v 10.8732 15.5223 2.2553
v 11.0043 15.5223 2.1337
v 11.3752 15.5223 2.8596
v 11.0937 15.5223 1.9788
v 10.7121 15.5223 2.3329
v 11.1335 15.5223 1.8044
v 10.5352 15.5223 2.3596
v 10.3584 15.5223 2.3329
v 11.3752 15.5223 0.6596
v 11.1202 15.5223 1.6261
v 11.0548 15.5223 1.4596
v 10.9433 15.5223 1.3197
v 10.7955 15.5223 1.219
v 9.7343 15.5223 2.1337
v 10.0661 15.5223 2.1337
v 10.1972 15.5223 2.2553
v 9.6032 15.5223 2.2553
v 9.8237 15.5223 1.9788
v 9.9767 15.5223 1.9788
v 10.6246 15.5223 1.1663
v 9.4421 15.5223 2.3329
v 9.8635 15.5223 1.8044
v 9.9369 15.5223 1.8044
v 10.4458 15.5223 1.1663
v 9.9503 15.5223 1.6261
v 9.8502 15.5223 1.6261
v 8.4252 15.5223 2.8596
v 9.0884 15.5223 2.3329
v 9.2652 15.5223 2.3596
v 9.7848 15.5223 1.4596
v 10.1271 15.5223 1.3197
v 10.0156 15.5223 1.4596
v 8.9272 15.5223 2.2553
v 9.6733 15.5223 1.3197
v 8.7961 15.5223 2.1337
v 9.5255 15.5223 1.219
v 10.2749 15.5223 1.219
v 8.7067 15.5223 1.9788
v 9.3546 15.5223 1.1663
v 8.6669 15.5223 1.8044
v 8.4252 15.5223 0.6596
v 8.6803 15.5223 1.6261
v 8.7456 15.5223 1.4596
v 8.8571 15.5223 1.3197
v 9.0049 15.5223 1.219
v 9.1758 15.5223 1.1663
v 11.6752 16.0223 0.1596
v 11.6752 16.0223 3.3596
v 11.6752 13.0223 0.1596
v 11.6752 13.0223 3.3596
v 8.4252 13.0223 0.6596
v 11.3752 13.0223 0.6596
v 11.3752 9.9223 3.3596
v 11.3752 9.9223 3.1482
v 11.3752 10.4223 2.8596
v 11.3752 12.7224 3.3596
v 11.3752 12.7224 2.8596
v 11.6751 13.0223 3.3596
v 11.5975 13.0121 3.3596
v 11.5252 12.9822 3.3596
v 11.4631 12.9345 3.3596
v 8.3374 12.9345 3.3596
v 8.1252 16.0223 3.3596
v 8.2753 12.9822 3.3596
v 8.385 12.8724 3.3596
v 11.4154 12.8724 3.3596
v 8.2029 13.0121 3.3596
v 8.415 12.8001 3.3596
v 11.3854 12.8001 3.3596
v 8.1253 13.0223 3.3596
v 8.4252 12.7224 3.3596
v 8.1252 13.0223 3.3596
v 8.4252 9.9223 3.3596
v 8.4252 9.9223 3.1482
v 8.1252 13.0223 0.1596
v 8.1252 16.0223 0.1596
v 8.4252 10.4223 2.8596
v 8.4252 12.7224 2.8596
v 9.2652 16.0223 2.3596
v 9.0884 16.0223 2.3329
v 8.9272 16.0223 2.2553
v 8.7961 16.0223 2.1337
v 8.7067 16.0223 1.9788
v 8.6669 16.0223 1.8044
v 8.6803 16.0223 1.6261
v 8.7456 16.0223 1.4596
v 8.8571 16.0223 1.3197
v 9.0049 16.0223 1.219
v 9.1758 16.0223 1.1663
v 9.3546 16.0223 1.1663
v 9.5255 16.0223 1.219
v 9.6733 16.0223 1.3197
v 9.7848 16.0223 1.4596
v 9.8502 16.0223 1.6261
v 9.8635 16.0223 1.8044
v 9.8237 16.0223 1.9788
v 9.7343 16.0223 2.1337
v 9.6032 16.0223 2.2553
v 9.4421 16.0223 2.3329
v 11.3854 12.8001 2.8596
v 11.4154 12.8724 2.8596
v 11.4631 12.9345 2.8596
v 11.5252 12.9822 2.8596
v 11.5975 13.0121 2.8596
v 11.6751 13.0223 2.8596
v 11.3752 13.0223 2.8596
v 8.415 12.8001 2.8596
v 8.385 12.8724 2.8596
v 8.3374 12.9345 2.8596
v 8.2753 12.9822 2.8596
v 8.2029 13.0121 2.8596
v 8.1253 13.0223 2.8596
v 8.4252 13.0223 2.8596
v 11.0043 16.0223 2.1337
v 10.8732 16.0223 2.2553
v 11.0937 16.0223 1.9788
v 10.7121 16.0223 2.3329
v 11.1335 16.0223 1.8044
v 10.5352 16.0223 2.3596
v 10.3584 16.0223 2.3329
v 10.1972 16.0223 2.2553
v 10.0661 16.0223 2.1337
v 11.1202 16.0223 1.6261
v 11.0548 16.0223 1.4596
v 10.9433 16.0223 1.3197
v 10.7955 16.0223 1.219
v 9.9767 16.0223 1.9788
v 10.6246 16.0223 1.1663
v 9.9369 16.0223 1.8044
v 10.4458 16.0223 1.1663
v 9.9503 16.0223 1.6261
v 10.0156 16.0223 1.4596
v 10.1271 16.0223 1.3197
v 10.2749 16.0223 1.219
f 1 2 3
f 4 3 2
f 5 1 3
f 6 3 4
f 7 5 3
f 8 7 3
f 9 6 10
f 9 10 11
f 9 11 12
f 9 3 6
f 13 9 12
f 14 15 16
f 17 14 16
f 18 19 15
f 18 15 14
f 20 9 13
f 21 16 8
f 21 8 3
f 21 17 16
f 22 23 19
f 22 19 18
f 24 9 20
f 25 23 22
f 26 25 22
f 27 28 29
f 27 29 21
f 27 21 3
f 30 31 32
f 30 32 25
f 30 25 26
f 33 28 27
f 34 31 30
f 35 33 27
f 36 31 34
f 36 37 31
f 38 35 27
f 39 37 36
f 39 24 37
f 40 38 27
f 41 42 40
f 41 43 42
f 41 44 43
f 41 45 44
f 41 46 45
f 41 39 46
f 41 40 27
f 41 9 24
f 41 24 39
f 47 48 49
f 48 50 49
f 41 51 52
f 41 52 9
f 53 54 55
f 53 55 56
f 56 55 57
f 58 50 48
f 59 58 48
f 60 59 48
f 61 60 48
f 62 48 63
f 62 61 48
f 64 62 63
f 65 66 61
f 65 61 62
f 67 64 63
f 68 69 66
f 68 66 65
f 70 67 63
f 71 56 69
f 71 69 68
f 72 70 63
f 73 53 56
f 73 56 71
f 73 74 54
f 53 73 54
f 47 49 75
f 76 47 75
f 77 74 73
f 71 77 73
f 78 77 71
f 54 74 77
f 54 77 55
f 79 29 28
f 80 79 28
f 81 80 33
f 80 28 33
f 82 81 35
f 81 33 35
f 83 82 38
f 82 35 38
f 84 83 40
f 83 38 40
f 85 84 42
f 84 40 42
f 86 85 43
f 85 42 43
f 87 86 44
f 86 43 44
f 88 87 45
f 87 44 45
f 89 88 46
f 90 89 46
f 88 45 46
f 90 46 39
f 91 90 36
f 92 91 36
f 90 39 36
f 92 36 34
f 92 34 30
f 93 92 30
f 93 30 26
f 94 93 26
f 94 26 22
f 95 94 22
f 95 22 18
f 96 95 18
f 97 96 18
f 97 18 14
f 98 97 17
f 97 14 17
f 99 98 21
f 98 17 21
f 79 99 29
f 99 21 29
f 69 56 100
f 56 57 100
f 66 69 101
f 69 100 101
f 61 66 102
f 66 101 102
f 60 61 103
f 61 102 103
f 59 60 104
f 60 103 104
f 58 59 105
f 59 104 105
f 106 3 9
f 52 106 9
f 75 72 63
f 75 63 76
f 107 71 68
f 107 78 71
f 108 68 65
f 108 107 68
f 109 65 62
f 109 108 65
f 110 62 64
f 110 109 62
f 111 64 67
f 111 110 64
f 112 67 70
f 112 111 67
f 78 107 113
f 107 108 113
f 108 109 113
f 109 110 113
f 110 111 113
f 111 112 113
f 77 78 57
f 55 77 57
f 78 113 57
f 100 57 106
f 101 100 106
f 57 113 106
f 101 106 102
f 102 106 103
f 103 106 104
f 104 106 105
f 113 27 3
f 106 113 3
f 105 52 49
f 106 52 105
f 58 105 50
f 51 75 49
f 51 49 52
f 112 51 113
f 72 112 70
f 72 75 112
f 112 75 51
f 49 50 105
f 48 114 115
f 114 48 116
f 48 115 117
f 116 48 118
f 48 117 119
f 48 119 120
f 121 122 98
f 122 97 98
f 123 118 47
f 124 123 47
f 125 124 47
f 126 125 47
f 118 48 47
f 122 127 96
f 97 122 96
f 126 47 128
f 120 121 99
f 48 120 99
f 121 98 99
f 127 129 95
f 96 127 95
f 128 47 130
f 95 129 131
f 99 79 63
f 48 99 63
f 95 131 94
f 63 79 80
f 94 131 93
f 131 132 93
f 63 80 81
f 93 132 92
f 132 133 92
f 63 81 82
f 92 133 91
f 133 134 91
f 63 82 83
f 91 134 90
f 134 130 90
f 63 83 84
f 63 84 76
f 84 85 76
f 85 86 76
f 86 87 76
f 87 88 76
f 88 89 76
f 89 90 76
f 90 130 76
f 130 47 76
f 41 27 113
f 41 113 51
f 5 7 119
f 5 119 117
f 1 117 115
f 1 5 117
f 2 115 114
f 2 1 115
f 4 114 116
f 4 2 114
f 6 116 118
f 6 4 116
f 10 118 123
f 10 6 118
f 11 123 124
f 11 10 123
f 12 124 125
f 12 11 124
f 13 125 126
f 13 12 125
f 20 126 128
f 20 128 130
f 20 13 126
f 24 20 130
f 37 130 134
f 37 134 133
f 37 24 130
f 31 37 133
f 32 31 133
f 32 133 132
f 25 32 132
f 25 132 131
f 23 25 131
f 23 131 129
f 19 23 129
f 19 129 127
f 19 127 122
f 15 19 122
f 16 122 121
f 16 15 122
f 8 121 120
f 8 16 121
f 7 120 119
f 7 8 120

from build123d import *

# Parameters (mm, degrees)
SKETCH1_W           = 2.95
SKETCH1_H           = 5.6
BOSS_EXTRUDE1_DEPTH = 0.5
SKETCH2_W           = 3.2
SKETCH2_H           = 2.5
BOSS_EXTRUDE2_DEPTH = 0.3
SKETCH3_W           = 0.5
SKETCH3_H           = 2.5
BOSS_EXTRUDE3_DEPTH = 1.475
SKETCH4_W           = 1.775
SKETCH4_H           = 3.2
SKETCH4_R           = 0.6
BOSS_EXTRUDE4_DEPTH = 0.5
CHAMFER1_SIZE       = 0.5
CHAMFER1_SIZE2      = 0.288675135
FILLET1_R           = 0.3


with BuildPart() as part:
    # Sketch1 → Boss-Extrude1 (new body)
    with BuildSketch(Plane.XY.offset(2.859564597)):
        with Locations((9.900211803, 12.722346538)):
            Rectangle(SKETCH1_W, SKETCH1_H)
    extrude(amount=BOSS_EXTRUDE1_DEPTH)

    # Sketch2 → Boss-Extrude2 (add)
    with BuildSketch(Plane(origin=(11.375211803, 0, 0), x_dir=(0, 0, -1), z_dir=(1, 0, 0))):
        with Locations((-1.759564597, 14.272346538)):
            Rectangle(SKETCH2_W, SKETCH2_H)
    boss_extrude2 = extrude(amount=BOSS_EXTRUDE2_DEPTH)

    # Sketch3 → Boss-Extrude3 (add)
    with BuildSketch(Plane.ZY.offset(-11.375211803)):
        with Locations((0.409564597, 14.272346538)):
            Rectangle(SKETCH3_W, SKETCH3_H)
    boss_extrude3 = extrude(amount=BOSS_EXTRUDE3_DEPTH)

    # Sketch4 → Boss-Extrude4 (add)
    with BuildSketch(Plane(origin=(0, 15.522346538, 0), x_dir=(1, 0, 0), z_dir=(0, 1, 0))):
        with Locations((10.787711803, -1.759564597)):
            Rectangle(SKETCH4_W, SKETCH4_H)
        with Locations(Location((10.535211803, -1.759564597, 0), (0, 0, 270))):
            Circle(SKETCH4_R, mode=Mode.SUBTRACT)
    boss_extrude4 = extrude(amount=BOSS_EXTRUDE4_DEPTH)

    # Mirror1: Boss-Extrude2, Boss-Extrude3, Boss-Extrude4 across plane
    add(boss_extrude2.mirror(Plane(origin=(9.900211803, 0, 0), x_dir=(0, 0, 1), z_dir=(1, 0, 0))))
    add(boss_extrude3.mirror(Plane(origin=(9.900211803, 0, 0), x_dir=(0, 0, 1), z_dir=(1, 0, 0))))
    add(boss_extrude4.mirror(Plane(origin=(9.900211803, 0, 0), x_dir=(0, 0, 1), z_dir=(1, 0, 0))))

    # Chamfer1
    chamfer1_edges = [part.edges().sort_by_distance(p)[0] for p in [
        (9.900211803, 9.922346538, 2.859564597),
    ]]
    chamfer1_side = [part.faces().sort_by_distance(p)[0] for p in [
        (9.900211803, 12.722346538, 2.859564597),
    ]]
    chamfer(chamfer1_edges, length=CHAMFER1_SIZE, length2=CHAMFER1_SIZE2, reference=chamfer1_side[0])

    # Fillet1
    fillet1_edges = [part.edges().sort_by_distance(p)[0] for p in [
        (11.375211803, 13.022346538, 3.109564597),
        (8.425211803, 13.022346538, 3.109564597),
    ]]
    fillet(fillet1_edges, radius=FILLET1_R - 0.0001)  # a hair under: the kernel refuses the full size


solid = part.part
